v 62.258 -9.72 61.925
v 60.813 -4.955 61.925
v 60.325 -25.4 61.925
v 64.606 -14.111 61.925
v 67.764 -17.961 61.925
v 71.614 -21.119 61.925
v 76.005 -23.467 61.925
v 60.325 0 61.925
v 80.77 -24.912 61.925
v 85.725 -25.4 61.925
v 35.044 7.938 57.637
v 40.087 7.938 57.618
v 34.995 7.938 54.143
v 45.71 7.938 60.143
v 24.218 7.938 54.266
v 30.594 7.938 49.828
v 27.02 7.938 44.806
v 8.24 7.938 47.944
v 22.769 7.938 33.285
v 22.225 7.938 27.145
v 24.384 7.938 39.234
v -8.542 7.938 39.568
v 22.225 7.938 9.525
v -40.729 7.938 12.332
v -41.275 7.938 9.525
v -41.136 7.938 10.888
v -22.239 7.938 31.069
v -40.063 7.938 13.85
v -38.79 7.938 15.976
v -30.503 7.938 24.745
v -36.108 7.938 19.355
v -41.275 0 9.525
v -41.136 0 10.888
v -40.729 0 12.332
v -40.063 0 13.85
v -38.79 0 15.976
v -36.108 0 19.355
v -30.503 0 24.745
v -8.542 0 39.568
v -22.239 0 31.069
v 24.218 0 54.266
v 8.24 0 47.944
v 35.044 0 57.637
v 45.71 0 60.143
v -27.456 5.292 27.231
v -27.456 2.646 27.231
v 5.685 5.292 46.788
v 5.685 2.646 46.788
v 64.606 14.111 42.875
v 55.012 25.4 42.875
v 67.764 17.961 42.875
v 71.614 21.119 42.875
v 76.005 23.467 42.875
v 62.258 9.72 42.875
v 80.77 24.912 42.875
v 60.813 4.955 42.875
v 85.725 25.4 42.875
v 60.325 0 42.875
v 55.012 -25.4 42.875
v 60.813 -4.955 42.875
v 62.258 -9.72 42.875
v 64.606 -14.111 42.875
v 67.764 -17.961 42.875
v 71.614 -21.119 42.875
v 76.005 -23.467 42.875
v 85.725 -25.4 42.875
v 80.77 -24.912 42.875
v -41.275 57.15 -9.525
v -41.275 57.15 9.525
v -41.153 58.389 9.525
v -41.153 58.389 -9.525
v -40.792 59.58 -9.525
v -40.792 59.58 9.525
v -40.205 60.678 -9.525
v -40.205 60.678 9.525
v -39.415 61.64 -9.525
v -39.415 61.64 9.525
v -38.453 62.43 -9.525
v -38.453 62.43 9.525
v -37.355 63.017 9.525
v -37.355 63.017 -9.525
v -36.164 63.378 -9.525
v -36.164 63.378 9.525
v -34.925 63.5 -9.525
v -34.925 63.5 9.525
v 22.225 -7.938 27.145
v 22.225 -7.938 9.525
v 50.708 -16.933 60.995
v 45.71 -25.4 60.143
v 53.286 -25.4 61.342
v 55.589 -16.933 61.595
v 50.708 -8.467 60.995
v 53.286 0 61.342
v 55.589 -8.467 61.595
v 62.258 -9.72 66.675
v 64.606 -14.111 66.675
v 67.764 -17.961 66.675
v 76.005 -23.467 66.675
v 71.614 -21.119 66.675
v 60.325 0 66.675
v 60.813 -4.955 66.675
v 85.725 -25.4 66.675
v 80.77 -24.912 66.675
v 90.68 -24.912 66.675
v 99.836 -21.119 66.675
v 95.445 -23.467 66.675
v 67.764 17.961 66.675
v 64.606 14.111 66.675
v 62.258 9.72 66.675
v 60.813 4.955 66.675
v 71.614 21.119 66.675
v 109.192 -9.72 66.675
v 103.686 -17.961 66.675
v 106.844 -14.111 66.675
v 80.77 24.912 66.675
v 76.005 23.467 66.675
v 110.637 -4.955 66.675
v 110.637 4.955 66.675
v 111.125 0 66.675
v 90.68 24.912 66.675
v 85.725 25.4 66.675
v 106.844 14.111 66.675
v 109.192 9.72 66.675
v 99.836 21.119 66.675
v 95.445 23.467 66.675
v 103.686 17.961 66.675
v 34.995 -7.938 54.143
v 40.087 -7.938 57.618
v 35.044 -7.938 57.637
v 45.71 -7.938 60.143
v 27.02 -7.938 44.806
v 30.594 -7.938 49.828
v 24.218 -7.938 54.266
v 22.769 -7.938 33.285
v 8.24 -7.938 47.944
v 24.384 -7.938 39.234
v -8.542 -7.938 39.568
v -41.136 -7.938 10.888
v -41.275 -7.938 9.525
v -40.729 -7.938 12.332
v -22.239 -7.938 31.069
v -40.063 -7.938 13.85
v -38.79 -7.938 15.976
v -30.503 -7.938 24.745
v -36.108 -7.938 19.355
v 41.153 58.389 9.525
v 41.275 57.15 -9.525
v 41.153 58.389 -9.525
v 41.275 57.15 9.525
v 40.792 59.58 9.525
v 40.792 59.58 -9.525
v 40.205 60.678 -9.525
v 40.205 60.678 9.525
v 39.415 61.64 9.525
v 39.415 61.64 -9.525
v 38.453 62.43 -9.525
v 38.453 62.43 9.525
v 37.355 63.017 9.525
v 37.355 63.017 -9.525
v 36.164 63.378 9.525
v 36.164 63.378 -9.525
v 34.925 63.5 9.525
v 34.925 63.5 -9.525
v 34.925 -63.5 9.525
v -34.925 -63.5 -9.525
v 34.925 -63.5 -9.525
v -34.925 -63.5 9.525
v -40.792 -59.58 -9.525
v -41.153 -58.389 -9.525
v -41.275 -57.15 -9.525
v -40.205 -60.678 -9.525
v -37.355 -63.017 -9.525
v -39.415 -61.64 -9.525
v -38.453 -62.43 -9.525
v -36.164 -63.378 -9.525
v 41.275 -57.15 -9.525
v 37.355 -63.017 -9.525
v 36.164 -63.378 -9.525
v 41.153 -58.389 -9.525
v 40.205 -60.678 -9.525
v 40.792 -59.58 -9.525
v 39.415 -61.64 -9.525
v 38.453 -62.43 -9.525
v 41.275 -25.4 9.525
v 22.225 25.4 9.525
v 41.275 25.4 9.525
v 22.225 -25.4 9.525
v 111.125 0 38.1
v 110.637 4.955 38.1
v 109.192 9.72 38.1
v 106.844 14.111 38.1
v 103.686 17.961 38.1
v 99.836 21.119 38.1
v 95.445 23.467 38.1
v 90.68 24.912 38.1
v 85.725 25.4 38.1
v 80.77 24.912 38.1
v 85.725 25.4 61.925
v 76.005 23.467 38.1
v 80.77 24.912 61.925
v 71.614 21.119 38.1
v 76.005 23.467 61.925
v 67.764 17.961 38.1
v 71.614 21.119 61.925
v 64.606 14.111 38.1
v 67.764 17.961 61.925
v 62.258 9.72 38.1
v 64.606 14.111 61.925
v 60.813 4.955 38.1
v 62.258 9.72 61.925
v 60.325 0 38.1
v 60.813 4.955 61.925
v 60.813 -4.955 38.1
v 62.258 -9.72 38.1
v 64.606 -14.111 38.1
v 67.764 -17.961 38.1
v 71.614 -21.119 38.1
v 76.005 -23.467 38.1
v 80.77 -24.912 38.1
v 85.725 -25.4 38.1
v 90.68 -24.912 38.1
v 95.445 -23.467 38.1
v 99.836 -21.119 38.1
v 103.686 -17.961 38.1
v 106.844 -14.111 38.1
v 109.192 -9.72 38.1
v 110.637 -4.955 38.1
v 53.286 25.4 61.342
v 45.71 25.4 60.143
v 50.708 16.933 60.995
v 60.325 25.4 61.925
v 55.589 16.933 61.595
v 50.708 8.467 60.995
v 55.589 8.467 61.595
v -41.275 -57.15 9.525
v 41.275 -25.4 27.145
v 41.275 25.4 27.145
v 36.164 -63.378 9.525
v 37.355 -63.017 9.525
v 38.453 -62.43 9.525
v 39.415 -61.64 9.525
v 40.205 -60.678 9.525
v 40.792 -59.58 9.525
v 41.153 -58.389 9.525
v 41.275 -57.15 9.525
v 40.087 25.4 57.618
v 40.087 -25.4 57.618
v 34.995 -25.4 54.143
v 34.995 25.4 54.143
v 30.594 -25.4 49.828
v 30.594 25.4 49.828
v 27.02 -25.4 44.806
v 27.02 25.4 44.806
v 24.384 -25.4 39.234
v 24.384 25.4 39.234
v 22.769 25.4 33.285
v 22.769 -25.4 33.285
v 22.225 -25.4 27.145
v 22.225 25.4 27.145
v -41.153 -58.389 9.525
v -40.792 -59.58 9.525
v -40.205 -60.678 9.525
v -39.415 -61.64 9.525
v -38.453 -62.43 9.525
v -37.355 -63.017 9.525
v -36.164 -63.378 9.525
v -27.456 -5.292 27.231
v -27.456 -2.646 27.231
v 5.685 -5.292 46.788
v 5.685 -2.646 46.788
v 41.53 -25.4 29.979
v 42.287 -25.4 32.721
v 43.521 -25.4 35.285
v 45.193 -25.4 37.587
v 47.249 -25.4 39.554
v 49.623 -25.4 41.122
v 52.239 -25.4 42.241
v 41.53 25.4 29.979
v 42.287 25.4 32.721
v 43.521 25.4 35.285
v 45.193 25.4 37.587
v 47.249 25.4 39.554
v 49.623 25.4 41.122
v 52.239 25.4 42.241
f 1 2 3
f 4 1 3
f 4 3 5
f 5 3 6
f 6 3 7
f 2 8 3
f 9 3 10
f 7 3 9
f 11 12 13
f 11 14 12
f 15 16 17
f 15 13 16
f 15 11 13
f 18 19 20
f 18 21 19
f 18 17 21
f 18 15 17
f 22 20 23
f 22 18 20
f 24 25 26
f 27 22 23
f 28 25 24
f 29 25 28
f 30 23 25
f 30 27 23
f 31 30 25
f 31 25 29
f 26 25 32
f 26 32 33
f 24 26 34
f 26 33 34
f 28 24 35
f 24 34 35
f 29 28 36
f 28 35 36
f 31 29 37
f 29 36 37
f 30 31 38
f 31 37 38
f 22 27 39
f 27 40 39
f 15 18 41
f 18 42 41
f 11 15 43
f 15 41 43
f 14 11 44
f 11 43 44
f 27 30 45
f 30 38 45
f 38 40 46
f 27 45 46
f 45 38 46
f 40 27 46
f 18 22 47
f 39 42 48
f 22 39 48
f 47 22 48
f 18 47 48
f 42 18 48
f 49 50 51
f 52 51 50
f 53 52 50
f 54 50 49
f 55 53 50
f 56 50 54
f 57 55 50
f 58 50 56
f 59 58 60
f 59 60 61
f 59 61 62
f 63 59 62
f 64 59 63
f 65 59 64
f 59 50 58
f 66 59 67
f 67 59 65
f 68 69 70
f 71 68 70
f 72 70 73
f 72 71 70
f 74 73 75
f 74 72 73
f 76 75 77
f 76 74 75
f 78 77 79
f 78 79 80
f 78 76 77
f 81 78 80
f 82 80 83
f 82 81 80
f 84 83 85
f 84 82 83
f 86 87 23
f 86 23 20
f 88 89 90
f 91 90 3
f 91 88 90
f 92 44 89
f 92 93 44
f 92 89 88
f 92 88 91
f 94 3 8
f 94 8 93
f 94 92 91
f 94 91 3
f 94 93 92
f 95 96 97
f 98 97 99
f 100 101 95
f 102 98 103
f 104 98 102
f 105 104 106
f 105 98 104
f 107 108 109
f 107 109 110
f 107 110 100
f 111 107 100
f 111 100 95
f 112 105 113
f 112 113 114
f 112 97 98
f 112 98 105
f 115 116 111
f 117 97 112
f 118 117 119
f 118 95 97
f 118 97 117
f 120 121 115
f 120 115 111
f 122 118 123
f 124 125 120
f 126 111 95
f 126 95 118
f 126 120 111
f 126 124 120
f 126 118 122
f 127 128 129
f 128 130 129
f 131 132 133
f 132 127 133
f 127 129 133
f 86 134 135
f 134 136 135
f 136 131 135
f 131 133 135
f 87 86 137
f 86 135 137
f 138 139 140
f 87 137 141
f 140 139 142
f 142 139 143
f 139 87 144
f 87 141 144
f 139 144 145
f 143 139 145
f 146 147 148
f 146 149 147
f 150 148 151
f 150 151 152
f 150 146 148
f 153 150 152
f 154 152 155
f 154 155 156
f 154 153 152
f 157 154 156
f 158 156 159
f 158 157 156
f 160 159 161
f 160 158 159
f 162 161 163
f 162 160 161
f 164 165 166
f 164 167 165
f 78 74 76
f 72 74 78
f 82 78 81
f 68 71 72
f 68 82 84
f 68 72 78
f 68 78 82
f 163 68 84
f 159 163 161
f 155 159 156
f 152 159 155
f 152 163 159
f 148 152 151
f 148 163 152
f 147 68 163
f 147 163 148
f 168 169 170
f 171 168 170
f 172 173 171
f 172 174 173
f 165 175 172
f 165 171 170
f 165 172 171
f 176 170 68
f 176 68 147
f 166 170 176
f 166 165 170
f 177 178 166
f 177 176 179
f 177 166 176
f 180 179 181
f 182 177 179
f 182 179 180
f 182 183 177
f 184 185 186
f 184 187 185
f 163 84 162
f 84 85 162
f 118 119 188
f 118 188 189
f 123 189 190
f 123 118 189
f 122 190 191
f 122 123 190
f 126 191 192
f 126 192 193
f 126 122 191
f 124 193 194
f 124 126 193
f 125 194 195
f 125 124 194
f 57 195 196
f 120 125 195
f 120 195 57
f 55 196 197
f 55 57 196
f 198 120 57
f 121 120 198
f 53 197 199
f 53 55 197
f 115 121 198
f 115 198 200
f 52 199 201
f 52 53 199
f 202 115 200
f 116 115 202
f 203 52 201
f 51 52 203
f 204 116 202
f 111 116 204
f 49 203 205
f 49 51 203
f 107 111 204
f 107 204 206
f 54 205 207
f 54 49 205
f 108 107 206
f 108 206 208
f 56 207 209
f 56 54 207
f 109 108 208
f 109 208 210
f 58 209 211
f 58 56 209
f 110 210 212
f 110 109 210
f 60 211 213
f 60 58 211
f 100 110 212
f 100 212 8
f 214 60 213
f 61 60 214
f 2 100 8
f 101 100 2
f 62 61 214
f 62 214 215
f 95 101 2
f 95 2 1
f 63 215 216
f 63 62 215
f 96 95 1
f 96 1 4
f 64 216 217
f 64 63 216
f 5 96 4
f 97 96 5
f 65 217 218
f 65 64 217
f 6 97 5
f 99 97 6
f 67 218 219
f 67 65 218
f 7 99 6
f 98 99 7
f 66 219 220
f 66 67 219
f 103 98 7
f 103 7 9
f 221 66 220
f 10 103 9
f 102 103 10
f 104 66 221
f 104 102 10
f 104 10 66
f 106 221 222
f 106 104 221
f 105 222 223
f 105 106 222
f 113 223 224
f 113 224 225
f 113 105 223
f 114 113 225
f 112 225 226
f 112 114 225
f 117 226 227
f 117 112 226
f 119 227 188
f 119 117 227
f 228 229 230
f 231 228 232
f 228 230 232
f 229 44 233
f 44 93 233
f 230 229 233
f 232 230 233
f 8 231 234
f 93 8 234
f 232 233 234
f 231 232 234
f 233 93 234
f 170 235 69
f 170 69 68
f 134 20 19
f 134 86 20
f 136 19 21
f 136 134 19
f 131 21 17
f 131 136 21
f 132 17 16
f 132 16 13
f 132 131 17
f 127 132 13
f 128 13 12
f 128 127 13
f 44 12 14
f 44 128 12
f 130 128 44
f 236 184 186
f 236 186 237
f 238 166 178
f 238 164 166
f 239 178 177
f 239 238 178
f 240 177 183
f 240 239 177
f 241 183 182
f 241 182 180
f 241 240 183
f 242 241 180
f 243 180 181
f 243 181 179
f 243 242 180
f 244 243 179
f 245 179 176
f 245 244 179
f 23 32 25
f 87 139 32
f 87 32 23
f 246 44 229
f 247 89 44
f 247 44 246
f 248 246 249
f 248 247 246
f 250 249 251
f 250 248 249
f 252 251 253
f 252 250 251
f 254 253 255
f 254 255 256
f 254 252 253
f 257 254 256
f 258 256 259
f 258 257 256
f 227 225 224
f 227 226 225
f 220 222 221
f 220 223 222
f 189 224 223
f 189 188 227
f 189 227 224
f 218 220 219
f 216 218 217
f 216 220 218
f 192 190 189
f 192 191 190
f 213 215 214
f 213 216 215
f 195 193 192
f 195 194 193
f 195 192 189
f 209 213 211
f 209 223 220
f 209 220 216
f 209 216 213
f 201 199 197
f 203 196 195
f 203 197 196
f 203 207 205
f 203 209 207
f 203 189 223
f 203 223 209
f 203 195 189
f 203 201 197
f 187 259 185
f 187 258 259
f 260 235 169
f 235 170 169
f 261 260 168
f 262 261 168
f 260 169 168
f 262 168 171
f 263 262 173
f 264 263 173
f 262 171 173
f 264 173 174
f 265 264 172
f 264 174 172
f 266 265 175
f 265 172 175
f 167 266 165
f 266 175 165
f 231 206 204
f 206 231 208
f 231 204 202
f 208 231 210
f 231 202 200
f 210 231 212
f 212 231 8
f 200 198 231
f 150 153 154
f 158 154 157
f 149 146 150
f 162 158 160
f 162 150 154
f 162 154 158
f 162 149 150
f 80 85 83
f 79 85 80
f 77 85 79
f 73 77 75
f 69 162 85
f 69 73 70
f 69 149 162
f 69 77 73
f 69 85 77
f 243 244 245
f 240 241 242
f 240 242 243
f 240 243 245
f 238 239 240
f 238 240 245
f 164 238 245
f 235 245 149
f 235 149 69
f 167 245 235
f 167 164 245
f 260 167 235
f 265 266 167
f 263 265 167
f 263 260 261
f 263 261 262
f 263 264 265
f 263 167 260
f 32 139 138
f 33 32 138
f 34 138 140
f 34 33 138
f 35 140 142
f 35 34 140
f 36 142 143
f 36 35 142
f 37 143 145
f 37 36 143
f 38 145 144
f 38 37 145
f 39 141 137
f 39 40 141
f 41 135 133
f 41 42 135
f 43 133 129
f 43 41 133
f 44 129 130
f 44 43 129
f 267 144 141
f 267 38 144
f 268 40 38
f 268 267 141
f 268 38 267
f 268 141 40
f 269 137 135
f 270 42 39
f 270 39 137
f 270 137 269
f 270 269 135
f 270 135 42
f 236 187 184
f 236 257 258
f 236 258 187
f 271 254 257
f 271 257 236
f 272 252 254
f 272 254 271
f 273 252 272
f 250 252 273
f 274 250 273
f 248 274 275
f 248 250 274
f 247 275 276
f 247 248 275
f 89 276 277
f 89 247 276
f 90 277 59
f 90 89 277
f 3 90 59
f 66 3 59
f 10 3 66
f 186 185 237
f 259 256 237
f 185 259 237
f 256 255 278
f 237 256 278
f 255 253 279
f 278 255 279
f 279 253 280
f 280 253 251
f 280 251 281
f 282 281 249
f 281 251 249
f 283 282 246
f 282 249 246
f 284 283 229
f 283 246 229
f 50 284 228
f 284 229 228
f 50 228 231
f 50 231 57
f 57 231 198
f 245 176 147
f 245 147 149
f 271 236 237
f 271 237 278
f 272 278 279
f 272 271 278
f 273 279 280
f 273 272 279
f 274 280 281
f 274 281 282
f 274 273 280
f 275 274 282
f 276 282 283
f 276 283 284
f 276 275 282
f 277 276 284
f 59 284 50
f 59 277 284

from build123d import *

# Parameters (mm, degrees)
F1_DEPTH = 63.5
F0_W     = 25.4
F0_H     = 19.05
F2_DEPTH = 25.4
F3_DEPTH = 7.9375
F5_R     = 6.35


with BuildPart() as f1:
    # F0 (on Front) → F1 (new body, symmetric)
    with BuildSketch(Plane.XZ):
        Polygon((-41.275, -9.525), (41.275, -9.525), (41.275, 9.525), (22.225, 9.525), (-41.275, 9.525), align=None)
    extrude(amount=F1_DEPTH, both=True)

    # F5
    f5_edges = [f1.edges().sort_by_distance(p)[0] for p in [
        (41.275, -63.5, 0),
        (-41.275, -63.5, 0),
        (41.275, 63.5, 0),
        (-41.275, 63.5, 0),
    ]]
    fillet(f5_edges, radius=F5_R)


with BuildPart() as f2:
    # F0 (on Front) → F2 (new body, symmetric)
    with BuildSketch(Plane.XZ):
        with BuildLine():
            Line((22.225, 9.525), (41.275, 9.525))
            Line((41.275, 9.525), (41.275, 27.144818))
            ThreePointArc((41.275, 27.144818), (45.192678, 37.586948), (55.012082, 42.8752))
            Line((55.012082, 42.8752), (60.325, 42.8752))
            Line((60.325, 42.8752), (60.325, 61.9252))
            add(Edge.make_bspline(
                [(45.710131, 60.143075), (50.758563, 61.115096), (55.669671, 61.734698), (60.325, 61.9252)],
                knots=[101.309781, 101.309781, 101.309781, 101.309781, 114.316845, 114.316845, 114.316845, 114.316845], degree=3))
            ThreePointArc((45.710131, 60.143075), (28.695712, 47.395968), (22.225, 27.144818))
            Line((22.225, 27.144818), (22.225, 9.525))
        make_face()
        with Locations((73.025, 52.4002)):
            Rectangle(F0_W, F0_H)
    extrude(amount=F2_DEPTH, both=True)

    # F0 (on Front) → F4 (revolve)
    with BuildSketch(Plane.XZ):
        Polygon((85.725, 66.675), (85.725, 61.9252), (85.725, 42.8752), (85.725, 38.1), (111.125, 38.1), (111.125, 66.675), align=None)
    revolve(axis=Axis((85.725, 0, 52.3875), (0, 0, 1)))


with BuildPart() as f3:
    # F0 (on Front) → F3 (new body, symmetric)
    with BuildSketch(Plane.XZ):
        with BuildLine():
            add(Edge.make_bspline(
                [(-41.275, 9.525), (-41.263515, 23.621546), (6.388761, 52.572176), (45.710131, 60.143075)],
                knots=[0, 0, 0, 0, 101.309781, 101.309781, 101.309781, 101.309781], degree=3))
            Line((-41.275, 9.525), (22.225, 9.525))
            Line((22.225, 9.525), (22.225, 27.144818))
            ThreePointArc((22.225, 27.144818), (28.695712, 47.395968), (45.710131, 60.143075))
        make_face()
    extrude(amount=F3_DEPTH, both=True)


solid = Compound([f1.part, f2.part, f3.part])
